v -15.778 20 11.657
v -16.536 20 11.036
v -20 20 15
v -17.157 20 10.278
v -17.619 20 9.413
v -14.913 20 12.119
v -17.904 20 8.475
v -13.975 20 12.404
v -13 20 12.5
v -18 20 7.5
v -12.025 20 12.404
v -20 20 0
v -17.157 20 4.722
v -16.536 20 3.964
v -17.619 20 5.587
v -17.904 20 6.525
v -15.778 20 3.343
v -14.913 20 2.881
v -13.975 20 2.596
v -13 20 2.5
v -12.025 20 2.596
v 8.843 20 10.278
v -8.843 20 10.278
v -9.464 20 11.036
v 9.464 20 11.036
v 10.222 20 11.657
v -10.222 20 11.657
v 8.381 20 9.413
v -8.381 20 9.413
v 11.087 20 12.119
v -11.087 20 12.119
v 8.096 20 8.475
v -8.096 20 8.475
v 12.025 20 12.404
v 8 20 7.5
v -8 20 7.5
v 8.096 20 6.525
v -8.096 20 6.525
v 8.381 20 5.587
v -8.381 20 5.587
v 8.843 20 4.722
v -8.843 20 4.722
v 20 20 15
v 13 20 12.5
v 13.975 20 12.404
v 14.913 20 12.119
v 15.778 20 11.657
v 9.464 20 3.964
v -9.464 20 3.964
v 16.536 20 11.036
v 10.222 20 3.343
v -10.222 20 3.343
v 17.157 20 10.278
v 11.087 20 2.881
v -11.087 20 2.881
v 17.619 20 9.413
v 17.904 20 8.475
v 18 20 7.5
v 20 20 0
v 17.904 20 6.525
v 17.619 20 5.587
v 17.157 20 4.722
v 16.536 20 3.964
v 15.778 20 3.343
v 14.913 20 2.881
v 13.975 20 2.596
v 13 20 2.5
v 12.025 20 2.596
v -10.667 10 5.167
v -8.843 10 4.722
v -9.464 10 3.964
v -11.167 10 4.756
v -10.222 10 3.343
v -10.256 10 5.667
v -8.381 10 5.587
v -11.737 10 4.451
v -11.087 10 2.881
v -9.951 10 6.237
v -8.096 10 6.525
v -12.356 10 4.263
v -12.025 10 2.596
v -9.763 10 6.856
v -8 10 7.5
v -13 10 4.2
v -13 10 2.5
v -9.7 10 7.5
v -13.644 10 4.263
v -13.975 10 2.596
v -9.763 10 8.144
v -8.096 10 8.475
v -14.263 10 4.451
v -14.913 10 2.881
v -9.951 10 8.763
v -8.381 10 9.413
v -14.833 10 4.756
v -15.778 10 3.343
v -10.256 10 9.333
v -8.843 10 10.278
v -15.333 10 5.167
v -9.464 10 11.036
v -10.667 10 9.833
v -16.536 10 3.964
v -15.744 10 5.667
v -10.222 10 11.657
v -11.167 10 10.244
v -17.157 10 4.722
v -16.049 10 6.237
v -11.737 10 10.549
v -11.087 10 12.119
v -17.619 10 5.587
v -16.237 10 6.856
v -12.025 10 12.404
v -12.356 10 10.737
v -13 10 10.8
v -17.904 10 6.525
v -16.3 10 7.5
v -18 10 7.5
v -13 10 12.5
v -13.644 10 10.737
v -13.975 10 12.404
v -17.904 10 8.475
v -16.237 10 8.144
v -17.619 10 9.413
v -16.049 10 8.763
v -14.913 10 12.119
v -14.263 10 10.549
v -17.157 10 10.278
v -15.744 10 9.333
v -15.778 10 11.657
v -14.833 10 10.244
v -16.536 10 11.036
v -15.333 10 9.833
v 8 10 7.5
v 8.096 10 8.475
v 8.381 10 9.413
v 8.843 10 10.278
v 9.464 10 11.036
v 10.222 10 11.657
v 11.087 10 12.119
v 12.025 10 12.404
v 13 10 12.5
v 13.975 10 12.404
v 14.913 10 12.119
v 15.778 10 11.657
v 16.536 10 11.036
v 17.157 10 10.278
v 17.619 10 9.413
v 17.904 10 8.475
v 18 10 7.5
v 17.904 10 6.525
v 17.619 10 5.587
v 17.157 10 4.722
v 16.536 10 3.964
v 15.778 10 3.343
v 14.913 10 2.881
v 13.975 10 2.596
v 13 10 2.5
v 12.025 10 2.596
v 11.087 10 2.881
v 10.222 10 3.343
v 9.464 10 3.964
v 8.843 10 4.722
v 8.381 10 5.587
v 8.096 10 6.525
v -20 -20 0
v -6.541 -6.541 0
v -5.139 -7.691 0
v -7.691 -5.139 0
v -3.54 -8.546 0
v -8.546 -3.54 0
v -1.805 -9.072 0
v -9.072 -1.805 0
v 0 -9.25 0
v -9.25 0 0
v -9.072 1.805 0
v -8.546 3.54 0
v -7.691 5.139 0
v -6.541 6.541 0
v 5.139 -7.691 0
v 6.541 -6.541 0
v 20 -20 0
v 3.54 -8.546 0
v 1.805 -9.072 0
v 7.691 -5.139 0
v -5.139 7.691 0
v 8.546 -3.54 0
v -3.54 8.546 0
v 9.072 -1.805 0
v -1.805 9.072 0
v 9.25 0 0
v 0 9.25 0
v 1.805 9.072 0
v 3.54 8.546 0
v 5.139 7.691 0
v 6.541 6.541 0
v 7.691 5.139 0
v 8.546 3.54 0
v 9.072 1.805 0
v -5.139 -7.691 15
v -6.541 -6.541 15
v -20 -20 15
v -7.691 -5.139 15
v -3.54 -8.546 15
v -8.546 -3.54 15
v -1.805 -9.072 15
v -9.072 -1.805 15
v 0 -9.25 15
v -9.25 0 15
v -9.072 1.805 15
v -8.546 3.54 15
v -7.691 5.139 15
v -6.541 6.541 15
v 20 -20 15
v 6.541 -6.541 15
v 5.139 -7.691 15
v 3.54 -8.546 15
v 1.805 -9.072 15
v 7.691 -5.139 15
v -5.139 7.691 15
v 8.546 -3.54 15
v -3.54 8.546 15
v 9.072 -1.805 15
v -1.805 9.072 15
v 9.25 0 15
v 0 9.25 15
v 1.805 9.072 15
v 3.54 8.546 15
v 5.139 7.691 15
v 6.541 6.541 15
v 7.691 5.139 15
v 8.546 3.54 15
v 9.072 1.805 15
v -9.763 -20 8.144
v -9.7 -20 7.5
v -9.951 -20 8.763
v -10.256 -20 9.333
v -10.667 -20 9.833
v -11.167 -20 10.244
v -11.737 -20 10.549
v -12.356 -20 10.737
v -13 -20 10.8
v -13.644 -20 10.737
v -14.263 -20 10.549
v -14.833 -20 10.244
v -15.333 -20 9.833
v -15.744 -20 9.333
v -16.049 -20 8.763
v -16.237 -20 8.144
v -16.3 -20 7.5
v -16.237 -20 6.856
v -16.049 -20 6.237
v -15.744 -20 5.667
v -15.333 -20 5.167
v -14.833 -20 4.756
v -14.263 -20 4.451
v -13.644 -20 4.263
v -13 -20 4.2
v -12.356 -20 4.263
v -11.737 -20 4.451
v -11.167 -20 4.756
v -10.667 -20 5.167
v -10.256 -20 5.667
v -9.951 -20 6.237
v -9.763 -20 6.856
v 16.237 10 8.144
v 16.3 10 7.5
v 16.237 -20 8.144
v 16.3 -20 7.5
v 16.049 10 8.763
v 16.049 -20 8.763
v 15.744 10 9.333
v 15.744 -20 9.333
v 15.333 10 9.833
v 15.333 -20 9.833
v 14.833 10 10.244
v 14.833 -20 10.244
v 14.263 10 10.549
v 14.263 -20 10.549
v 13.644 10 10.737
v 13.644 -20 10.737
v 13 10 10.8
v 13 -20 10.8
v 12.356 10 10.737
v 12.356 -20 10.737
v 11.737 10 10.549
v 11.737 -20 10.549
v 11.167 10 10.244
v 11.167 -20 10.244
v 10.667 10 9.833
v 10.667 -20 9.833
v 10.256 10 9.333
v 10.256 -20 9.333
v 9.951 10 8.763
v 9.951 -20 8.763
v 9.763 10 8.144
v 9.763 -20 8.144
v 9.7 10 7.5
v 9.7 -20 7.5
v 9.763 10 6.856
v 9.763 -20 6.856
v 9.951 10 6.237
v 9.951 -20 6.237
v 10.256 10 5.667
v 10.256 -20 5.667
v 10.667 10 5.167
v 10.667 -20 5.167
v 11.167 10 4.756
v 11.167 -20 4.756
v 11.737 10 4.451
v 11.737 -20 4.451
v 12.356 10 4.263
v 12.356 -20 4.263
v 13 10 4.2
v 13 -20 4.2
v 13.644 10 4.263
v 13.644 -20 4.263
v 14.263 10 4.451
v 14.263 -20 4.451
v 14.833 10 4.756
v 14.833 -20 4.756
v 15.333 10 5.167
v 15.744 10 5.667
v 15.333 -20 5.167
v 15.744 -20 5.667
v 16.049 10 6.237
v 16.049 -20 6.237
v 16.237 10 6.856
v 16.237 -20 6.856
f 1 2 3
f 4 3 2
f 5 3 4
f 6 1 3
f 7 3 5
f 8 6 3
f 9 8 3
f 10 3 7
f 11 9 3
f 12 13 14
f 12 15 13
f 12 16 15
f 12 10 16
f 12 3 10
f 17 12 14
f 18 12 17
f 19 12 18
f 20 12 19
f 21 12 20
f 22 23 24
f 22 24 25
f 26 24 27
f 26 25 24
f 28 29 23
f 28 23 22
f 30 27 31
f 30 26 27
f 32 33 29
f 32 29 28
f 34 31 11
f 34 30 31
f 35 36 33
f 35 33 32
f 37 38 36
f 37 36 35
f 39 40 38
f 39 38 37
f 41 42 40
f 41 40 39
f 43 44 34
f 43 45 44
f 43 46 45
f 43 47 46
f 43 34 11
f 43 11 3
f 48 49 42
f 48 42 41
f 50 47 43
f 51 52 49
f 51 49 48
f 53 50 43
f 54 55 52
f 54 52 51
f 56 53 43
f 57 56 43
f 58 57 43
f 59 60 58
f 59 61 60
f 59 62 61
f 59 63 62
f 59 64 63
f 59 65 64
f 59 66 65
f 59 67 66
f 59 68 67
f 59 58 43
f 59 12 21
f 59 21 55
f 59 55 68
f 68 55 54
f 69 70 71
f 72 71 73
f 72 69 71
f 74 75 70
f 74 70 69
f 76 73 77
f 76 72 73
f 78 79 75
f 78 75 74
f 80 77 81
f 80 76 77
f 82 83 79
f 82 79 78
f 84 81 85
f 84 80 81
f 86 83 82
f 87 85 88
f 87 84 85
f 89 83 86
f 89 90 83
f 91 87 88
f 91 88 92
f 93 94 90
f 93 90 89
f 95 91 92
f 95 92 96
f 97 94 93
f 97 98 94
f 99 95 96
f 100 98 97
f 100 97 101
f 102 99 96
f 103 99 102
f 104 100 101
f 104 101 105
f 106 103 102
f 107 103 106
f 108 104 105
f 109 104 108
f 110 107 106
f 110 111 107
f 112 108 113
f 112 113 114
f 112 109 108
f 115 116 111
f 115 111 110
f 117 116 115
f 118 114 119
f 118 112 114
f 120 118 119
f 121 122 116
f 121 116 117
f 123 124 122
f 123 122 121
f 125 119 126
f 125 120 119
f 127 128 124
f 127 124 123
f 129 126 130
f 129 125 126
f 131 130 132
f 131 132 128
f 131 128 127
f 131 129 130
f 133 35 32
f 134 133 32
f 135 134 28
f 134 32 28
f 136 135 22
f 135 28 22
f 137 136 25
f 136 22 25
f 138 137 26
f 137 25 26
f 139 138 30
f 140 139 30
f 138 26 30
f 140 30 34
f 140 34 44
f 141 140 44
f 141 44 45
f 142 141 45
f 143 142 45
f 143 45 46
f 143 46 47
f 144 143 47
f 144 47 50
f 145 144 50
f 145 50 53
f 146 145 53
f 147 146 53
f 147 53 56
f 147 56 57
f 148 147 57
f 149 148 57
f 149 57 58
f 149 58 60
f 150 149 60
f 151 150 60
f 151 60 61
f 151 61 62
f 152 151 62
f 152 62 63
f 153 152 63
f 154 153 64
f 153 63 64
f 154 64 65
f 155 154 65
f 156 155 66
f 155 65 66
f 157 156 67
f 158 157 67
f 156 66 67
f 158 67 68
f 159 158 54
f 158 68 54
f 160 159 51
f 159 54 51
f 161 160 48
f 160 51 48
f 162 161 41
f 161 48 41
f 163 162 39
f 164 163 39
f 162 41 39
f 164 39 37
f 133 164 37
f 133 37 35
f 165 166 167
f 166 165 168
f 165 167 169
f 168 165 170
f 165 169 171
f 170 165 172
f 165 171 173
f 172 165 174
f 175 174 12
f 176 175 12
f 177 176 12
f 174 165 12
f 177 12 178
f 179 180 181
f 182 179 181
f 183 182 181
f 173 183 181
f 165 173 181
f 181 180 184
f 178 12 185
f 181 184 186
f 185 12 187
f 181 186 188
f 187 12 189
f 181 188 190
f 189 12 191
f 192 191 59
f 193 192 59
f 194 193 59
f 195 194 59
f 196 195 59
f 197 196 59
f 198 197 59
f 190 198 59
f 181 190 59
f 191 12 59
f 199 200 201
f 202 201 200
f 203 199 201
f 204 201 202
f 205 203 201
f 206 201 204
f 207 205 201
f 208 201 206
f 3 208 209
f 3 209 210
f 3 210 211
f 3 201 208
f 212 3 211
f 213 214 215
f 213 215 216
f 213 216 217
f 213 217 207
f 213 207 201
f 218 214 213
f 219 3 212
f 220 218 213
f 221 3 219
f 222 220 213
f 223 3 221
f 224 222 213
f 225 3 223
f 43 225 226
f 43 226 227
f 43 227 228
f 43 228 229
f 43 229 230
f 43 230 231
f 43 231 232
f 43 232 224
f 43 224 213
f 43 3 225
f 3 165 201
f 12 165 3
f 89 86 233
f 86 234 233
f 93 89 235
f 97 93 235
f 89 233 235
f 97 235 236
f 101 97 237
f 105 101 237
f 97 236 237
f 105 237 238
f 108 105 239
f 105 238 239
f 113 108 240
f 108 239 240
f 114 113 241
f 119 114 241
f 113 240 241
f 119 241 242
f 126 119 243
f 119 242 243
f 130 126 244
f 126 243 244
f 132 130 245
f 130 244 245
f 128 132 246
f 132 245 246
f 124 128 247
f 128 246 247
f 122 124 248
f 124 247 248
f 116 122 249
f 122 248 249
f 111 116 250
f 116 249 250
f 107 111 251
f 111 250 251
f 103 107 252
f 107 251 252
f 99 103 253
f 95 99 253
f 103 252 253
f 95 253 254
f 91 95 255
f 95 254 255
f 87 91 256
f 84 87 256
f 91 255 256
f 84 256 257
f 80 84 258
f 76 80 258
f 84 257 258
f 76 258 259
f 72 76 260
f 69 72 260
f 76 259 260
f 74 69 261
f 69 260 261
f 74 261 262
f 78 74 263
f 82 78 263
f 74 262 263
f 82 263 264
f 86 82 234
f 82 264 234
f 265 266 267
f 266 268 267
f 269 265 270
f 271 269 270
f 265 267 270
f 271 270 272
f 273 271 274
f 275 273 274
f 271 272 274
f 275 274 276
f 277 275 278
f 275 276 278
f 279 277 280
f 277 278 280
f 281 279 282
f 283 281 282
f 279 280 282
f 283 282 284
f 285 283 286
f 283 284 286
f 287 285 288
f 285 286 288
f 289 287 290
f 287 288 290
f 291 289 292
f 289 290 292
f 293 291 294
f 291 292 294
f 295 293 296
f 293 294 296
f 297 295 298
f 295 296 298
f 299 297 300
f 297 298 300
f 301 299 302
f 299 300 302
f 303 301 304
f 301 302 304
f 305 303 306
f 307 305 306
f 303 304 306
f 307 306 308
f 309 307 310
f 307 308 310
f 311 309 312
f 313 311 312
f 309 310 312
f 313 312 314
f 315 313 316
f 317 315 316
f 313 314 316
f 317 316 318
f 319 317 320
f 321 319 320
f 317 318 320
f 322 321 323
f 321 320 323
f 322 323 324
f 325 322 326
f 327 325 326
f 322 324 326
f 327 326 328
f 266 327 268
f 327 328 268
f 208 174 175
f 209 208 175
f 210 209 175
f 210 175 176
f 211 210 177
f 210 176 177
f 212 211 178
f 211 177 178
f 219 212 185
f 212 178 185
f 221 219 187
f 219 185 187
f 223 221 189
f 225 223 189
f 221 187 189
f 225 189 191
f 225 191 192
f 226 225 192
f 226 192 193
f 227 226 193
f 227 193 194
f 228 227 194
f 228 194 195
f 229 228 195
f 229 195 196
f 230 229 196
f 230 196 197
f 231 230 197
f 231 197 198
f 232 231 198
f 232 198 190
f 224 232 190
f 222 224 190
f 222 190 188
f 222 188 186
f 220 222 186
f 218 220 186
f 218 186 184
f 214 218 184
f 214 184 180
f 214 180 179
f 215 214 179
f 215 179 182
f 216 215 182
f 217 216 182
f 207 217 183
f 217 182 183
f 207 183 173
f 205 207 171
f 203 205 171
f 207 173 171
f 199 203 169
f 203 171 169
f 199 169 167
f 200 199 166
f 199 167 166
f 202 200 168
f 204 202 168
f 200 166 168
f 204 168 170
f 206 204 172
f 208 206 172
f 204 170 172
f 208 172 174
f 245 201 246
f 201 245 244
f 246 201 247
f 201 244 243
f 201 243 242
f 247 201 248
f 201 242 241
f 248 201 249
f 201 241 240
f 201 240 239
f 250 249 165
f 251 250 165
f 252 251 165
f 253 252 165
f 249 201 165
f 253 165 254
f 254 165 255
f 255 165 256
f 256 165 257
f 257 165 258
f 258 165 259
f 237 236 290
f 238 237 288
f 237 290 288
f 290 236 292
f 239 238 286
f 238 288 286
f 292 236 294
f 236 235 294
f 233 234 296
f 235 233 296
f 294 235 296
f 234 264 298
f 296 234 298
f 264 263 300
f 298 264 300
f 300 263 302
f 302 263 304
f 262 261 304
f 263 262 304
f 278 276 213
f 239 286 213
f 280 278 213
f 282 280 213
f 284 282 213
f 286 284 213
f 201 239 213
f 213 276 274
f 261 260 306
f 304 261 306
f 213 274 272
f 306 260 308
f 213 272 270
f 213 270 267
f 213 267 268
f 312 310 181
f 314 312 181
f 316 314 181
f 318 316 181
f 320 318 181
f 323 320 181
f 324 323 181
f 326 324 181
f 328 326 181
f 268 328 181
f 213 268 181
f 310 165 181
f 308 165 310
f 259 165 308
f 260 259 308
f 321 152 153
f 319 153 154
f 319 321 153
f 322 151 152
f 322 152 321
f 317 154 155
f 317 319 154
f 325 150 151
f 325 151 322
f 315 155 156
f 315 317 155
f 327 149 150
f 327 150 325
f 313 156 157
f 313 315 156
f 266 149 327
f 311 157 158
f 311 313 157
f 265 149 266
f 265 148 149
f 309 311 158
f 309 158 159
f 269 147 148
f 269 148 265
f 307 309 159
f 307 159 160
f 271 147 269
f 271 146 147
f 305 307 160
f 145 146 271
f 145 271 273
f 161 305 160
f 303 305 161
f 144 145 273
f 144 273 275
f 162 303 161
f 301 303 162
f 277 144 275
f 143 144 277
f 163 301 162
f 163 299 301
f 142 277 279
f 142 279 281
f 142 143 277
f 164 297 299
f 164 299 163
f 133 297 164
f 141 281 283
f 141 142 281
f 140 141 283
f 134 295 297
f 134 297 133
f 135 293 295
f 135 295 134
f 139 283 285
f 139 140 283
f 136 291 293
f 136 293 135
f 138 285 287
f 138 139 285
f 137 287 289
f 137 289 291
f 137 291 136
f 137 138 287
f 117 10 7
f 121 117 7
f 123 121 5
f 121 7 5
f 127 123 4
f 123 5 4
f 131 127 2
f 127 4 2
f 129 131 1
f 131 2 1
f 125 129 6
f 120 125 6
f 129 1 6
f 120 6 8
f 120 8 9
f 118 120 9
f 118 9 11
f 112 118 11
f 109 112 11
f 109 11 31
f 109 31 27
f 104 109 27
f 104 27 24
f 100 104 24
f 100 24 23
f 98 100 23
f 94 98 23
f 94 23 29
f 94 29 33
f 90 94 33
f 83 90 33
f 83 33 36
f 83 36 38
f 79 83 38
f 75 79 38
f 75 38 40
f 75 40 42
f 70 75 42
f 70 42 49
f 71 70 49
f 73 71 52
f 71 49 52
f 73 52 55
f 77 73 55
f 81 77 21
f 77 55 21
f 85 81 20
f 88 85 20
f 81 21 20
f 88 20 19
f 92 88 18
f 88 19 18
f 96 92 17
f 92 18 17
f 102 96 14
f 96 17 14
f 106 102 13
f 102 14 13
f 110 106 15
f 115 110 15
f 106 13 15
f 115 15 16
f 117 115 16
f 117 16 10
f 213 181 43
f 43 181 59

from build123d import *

# Parameters (mm, degrees)
SKETCH_4_W                   = 40
SKETCH_4_H                   = 40
EXTRUDE_2_DEPTH              = 15
M20X1_5_2_D                  = 18.5
M20X1_5_2_DEPTH              = 44.5
M20X1_5_2_TIP                = 5.557960726
HOLE_WIZARD_M6_1_D           = 6.6
HOLE_WIZARD_M6_1_CBORE_D     = 10
HOLE_WIZARD_M6_1_CBORE_DEPTH = 10


with BuildPart() as part:
    # 草图4 → 凸台-拉伸2 (new body)
    with BuildSketch(Plane.XY):
        Rectangle(SKETCH_4_W, SKETCH_4_H)
    extrude(amount=EXTRUDE_2_DEPTH)

    # M20x1.5 螺纹孔2
    with Locations(Plane.XY.offset(15)):
        with Locations((0, 0)):
            Hole(M20X1_5_2_D / 2, depth=M20X1_5_2_DEPTH)
            with Locations((0, 0, -(M20X1_5_2_DEPTH + M20X1_5_2_TIP / 2))):  # 118° drill point
                Cone(0, M20X1_5_2_D / 2, M20X1_5_2_TIP, mode=Mode.SUBTRACT)

    # M6 凹头盖螺钉的柱形沉头孔1 (through all)
    with Locations(Plane(origin=(0, 20, 0), x_dir=(-1, 0, 0), z_dir=(0, 1, 0))):
        with Locations((13, 7.5), (-13, 7.5)):
            CounterBoreHole(HOLE_WIZARD_M6_1_D / 2, HOLE_WIZARD_M6_1_CBORE_D / 2, HOLE_WIZARD_M6_1_CBORE_DEPTH)


solid = part.part
